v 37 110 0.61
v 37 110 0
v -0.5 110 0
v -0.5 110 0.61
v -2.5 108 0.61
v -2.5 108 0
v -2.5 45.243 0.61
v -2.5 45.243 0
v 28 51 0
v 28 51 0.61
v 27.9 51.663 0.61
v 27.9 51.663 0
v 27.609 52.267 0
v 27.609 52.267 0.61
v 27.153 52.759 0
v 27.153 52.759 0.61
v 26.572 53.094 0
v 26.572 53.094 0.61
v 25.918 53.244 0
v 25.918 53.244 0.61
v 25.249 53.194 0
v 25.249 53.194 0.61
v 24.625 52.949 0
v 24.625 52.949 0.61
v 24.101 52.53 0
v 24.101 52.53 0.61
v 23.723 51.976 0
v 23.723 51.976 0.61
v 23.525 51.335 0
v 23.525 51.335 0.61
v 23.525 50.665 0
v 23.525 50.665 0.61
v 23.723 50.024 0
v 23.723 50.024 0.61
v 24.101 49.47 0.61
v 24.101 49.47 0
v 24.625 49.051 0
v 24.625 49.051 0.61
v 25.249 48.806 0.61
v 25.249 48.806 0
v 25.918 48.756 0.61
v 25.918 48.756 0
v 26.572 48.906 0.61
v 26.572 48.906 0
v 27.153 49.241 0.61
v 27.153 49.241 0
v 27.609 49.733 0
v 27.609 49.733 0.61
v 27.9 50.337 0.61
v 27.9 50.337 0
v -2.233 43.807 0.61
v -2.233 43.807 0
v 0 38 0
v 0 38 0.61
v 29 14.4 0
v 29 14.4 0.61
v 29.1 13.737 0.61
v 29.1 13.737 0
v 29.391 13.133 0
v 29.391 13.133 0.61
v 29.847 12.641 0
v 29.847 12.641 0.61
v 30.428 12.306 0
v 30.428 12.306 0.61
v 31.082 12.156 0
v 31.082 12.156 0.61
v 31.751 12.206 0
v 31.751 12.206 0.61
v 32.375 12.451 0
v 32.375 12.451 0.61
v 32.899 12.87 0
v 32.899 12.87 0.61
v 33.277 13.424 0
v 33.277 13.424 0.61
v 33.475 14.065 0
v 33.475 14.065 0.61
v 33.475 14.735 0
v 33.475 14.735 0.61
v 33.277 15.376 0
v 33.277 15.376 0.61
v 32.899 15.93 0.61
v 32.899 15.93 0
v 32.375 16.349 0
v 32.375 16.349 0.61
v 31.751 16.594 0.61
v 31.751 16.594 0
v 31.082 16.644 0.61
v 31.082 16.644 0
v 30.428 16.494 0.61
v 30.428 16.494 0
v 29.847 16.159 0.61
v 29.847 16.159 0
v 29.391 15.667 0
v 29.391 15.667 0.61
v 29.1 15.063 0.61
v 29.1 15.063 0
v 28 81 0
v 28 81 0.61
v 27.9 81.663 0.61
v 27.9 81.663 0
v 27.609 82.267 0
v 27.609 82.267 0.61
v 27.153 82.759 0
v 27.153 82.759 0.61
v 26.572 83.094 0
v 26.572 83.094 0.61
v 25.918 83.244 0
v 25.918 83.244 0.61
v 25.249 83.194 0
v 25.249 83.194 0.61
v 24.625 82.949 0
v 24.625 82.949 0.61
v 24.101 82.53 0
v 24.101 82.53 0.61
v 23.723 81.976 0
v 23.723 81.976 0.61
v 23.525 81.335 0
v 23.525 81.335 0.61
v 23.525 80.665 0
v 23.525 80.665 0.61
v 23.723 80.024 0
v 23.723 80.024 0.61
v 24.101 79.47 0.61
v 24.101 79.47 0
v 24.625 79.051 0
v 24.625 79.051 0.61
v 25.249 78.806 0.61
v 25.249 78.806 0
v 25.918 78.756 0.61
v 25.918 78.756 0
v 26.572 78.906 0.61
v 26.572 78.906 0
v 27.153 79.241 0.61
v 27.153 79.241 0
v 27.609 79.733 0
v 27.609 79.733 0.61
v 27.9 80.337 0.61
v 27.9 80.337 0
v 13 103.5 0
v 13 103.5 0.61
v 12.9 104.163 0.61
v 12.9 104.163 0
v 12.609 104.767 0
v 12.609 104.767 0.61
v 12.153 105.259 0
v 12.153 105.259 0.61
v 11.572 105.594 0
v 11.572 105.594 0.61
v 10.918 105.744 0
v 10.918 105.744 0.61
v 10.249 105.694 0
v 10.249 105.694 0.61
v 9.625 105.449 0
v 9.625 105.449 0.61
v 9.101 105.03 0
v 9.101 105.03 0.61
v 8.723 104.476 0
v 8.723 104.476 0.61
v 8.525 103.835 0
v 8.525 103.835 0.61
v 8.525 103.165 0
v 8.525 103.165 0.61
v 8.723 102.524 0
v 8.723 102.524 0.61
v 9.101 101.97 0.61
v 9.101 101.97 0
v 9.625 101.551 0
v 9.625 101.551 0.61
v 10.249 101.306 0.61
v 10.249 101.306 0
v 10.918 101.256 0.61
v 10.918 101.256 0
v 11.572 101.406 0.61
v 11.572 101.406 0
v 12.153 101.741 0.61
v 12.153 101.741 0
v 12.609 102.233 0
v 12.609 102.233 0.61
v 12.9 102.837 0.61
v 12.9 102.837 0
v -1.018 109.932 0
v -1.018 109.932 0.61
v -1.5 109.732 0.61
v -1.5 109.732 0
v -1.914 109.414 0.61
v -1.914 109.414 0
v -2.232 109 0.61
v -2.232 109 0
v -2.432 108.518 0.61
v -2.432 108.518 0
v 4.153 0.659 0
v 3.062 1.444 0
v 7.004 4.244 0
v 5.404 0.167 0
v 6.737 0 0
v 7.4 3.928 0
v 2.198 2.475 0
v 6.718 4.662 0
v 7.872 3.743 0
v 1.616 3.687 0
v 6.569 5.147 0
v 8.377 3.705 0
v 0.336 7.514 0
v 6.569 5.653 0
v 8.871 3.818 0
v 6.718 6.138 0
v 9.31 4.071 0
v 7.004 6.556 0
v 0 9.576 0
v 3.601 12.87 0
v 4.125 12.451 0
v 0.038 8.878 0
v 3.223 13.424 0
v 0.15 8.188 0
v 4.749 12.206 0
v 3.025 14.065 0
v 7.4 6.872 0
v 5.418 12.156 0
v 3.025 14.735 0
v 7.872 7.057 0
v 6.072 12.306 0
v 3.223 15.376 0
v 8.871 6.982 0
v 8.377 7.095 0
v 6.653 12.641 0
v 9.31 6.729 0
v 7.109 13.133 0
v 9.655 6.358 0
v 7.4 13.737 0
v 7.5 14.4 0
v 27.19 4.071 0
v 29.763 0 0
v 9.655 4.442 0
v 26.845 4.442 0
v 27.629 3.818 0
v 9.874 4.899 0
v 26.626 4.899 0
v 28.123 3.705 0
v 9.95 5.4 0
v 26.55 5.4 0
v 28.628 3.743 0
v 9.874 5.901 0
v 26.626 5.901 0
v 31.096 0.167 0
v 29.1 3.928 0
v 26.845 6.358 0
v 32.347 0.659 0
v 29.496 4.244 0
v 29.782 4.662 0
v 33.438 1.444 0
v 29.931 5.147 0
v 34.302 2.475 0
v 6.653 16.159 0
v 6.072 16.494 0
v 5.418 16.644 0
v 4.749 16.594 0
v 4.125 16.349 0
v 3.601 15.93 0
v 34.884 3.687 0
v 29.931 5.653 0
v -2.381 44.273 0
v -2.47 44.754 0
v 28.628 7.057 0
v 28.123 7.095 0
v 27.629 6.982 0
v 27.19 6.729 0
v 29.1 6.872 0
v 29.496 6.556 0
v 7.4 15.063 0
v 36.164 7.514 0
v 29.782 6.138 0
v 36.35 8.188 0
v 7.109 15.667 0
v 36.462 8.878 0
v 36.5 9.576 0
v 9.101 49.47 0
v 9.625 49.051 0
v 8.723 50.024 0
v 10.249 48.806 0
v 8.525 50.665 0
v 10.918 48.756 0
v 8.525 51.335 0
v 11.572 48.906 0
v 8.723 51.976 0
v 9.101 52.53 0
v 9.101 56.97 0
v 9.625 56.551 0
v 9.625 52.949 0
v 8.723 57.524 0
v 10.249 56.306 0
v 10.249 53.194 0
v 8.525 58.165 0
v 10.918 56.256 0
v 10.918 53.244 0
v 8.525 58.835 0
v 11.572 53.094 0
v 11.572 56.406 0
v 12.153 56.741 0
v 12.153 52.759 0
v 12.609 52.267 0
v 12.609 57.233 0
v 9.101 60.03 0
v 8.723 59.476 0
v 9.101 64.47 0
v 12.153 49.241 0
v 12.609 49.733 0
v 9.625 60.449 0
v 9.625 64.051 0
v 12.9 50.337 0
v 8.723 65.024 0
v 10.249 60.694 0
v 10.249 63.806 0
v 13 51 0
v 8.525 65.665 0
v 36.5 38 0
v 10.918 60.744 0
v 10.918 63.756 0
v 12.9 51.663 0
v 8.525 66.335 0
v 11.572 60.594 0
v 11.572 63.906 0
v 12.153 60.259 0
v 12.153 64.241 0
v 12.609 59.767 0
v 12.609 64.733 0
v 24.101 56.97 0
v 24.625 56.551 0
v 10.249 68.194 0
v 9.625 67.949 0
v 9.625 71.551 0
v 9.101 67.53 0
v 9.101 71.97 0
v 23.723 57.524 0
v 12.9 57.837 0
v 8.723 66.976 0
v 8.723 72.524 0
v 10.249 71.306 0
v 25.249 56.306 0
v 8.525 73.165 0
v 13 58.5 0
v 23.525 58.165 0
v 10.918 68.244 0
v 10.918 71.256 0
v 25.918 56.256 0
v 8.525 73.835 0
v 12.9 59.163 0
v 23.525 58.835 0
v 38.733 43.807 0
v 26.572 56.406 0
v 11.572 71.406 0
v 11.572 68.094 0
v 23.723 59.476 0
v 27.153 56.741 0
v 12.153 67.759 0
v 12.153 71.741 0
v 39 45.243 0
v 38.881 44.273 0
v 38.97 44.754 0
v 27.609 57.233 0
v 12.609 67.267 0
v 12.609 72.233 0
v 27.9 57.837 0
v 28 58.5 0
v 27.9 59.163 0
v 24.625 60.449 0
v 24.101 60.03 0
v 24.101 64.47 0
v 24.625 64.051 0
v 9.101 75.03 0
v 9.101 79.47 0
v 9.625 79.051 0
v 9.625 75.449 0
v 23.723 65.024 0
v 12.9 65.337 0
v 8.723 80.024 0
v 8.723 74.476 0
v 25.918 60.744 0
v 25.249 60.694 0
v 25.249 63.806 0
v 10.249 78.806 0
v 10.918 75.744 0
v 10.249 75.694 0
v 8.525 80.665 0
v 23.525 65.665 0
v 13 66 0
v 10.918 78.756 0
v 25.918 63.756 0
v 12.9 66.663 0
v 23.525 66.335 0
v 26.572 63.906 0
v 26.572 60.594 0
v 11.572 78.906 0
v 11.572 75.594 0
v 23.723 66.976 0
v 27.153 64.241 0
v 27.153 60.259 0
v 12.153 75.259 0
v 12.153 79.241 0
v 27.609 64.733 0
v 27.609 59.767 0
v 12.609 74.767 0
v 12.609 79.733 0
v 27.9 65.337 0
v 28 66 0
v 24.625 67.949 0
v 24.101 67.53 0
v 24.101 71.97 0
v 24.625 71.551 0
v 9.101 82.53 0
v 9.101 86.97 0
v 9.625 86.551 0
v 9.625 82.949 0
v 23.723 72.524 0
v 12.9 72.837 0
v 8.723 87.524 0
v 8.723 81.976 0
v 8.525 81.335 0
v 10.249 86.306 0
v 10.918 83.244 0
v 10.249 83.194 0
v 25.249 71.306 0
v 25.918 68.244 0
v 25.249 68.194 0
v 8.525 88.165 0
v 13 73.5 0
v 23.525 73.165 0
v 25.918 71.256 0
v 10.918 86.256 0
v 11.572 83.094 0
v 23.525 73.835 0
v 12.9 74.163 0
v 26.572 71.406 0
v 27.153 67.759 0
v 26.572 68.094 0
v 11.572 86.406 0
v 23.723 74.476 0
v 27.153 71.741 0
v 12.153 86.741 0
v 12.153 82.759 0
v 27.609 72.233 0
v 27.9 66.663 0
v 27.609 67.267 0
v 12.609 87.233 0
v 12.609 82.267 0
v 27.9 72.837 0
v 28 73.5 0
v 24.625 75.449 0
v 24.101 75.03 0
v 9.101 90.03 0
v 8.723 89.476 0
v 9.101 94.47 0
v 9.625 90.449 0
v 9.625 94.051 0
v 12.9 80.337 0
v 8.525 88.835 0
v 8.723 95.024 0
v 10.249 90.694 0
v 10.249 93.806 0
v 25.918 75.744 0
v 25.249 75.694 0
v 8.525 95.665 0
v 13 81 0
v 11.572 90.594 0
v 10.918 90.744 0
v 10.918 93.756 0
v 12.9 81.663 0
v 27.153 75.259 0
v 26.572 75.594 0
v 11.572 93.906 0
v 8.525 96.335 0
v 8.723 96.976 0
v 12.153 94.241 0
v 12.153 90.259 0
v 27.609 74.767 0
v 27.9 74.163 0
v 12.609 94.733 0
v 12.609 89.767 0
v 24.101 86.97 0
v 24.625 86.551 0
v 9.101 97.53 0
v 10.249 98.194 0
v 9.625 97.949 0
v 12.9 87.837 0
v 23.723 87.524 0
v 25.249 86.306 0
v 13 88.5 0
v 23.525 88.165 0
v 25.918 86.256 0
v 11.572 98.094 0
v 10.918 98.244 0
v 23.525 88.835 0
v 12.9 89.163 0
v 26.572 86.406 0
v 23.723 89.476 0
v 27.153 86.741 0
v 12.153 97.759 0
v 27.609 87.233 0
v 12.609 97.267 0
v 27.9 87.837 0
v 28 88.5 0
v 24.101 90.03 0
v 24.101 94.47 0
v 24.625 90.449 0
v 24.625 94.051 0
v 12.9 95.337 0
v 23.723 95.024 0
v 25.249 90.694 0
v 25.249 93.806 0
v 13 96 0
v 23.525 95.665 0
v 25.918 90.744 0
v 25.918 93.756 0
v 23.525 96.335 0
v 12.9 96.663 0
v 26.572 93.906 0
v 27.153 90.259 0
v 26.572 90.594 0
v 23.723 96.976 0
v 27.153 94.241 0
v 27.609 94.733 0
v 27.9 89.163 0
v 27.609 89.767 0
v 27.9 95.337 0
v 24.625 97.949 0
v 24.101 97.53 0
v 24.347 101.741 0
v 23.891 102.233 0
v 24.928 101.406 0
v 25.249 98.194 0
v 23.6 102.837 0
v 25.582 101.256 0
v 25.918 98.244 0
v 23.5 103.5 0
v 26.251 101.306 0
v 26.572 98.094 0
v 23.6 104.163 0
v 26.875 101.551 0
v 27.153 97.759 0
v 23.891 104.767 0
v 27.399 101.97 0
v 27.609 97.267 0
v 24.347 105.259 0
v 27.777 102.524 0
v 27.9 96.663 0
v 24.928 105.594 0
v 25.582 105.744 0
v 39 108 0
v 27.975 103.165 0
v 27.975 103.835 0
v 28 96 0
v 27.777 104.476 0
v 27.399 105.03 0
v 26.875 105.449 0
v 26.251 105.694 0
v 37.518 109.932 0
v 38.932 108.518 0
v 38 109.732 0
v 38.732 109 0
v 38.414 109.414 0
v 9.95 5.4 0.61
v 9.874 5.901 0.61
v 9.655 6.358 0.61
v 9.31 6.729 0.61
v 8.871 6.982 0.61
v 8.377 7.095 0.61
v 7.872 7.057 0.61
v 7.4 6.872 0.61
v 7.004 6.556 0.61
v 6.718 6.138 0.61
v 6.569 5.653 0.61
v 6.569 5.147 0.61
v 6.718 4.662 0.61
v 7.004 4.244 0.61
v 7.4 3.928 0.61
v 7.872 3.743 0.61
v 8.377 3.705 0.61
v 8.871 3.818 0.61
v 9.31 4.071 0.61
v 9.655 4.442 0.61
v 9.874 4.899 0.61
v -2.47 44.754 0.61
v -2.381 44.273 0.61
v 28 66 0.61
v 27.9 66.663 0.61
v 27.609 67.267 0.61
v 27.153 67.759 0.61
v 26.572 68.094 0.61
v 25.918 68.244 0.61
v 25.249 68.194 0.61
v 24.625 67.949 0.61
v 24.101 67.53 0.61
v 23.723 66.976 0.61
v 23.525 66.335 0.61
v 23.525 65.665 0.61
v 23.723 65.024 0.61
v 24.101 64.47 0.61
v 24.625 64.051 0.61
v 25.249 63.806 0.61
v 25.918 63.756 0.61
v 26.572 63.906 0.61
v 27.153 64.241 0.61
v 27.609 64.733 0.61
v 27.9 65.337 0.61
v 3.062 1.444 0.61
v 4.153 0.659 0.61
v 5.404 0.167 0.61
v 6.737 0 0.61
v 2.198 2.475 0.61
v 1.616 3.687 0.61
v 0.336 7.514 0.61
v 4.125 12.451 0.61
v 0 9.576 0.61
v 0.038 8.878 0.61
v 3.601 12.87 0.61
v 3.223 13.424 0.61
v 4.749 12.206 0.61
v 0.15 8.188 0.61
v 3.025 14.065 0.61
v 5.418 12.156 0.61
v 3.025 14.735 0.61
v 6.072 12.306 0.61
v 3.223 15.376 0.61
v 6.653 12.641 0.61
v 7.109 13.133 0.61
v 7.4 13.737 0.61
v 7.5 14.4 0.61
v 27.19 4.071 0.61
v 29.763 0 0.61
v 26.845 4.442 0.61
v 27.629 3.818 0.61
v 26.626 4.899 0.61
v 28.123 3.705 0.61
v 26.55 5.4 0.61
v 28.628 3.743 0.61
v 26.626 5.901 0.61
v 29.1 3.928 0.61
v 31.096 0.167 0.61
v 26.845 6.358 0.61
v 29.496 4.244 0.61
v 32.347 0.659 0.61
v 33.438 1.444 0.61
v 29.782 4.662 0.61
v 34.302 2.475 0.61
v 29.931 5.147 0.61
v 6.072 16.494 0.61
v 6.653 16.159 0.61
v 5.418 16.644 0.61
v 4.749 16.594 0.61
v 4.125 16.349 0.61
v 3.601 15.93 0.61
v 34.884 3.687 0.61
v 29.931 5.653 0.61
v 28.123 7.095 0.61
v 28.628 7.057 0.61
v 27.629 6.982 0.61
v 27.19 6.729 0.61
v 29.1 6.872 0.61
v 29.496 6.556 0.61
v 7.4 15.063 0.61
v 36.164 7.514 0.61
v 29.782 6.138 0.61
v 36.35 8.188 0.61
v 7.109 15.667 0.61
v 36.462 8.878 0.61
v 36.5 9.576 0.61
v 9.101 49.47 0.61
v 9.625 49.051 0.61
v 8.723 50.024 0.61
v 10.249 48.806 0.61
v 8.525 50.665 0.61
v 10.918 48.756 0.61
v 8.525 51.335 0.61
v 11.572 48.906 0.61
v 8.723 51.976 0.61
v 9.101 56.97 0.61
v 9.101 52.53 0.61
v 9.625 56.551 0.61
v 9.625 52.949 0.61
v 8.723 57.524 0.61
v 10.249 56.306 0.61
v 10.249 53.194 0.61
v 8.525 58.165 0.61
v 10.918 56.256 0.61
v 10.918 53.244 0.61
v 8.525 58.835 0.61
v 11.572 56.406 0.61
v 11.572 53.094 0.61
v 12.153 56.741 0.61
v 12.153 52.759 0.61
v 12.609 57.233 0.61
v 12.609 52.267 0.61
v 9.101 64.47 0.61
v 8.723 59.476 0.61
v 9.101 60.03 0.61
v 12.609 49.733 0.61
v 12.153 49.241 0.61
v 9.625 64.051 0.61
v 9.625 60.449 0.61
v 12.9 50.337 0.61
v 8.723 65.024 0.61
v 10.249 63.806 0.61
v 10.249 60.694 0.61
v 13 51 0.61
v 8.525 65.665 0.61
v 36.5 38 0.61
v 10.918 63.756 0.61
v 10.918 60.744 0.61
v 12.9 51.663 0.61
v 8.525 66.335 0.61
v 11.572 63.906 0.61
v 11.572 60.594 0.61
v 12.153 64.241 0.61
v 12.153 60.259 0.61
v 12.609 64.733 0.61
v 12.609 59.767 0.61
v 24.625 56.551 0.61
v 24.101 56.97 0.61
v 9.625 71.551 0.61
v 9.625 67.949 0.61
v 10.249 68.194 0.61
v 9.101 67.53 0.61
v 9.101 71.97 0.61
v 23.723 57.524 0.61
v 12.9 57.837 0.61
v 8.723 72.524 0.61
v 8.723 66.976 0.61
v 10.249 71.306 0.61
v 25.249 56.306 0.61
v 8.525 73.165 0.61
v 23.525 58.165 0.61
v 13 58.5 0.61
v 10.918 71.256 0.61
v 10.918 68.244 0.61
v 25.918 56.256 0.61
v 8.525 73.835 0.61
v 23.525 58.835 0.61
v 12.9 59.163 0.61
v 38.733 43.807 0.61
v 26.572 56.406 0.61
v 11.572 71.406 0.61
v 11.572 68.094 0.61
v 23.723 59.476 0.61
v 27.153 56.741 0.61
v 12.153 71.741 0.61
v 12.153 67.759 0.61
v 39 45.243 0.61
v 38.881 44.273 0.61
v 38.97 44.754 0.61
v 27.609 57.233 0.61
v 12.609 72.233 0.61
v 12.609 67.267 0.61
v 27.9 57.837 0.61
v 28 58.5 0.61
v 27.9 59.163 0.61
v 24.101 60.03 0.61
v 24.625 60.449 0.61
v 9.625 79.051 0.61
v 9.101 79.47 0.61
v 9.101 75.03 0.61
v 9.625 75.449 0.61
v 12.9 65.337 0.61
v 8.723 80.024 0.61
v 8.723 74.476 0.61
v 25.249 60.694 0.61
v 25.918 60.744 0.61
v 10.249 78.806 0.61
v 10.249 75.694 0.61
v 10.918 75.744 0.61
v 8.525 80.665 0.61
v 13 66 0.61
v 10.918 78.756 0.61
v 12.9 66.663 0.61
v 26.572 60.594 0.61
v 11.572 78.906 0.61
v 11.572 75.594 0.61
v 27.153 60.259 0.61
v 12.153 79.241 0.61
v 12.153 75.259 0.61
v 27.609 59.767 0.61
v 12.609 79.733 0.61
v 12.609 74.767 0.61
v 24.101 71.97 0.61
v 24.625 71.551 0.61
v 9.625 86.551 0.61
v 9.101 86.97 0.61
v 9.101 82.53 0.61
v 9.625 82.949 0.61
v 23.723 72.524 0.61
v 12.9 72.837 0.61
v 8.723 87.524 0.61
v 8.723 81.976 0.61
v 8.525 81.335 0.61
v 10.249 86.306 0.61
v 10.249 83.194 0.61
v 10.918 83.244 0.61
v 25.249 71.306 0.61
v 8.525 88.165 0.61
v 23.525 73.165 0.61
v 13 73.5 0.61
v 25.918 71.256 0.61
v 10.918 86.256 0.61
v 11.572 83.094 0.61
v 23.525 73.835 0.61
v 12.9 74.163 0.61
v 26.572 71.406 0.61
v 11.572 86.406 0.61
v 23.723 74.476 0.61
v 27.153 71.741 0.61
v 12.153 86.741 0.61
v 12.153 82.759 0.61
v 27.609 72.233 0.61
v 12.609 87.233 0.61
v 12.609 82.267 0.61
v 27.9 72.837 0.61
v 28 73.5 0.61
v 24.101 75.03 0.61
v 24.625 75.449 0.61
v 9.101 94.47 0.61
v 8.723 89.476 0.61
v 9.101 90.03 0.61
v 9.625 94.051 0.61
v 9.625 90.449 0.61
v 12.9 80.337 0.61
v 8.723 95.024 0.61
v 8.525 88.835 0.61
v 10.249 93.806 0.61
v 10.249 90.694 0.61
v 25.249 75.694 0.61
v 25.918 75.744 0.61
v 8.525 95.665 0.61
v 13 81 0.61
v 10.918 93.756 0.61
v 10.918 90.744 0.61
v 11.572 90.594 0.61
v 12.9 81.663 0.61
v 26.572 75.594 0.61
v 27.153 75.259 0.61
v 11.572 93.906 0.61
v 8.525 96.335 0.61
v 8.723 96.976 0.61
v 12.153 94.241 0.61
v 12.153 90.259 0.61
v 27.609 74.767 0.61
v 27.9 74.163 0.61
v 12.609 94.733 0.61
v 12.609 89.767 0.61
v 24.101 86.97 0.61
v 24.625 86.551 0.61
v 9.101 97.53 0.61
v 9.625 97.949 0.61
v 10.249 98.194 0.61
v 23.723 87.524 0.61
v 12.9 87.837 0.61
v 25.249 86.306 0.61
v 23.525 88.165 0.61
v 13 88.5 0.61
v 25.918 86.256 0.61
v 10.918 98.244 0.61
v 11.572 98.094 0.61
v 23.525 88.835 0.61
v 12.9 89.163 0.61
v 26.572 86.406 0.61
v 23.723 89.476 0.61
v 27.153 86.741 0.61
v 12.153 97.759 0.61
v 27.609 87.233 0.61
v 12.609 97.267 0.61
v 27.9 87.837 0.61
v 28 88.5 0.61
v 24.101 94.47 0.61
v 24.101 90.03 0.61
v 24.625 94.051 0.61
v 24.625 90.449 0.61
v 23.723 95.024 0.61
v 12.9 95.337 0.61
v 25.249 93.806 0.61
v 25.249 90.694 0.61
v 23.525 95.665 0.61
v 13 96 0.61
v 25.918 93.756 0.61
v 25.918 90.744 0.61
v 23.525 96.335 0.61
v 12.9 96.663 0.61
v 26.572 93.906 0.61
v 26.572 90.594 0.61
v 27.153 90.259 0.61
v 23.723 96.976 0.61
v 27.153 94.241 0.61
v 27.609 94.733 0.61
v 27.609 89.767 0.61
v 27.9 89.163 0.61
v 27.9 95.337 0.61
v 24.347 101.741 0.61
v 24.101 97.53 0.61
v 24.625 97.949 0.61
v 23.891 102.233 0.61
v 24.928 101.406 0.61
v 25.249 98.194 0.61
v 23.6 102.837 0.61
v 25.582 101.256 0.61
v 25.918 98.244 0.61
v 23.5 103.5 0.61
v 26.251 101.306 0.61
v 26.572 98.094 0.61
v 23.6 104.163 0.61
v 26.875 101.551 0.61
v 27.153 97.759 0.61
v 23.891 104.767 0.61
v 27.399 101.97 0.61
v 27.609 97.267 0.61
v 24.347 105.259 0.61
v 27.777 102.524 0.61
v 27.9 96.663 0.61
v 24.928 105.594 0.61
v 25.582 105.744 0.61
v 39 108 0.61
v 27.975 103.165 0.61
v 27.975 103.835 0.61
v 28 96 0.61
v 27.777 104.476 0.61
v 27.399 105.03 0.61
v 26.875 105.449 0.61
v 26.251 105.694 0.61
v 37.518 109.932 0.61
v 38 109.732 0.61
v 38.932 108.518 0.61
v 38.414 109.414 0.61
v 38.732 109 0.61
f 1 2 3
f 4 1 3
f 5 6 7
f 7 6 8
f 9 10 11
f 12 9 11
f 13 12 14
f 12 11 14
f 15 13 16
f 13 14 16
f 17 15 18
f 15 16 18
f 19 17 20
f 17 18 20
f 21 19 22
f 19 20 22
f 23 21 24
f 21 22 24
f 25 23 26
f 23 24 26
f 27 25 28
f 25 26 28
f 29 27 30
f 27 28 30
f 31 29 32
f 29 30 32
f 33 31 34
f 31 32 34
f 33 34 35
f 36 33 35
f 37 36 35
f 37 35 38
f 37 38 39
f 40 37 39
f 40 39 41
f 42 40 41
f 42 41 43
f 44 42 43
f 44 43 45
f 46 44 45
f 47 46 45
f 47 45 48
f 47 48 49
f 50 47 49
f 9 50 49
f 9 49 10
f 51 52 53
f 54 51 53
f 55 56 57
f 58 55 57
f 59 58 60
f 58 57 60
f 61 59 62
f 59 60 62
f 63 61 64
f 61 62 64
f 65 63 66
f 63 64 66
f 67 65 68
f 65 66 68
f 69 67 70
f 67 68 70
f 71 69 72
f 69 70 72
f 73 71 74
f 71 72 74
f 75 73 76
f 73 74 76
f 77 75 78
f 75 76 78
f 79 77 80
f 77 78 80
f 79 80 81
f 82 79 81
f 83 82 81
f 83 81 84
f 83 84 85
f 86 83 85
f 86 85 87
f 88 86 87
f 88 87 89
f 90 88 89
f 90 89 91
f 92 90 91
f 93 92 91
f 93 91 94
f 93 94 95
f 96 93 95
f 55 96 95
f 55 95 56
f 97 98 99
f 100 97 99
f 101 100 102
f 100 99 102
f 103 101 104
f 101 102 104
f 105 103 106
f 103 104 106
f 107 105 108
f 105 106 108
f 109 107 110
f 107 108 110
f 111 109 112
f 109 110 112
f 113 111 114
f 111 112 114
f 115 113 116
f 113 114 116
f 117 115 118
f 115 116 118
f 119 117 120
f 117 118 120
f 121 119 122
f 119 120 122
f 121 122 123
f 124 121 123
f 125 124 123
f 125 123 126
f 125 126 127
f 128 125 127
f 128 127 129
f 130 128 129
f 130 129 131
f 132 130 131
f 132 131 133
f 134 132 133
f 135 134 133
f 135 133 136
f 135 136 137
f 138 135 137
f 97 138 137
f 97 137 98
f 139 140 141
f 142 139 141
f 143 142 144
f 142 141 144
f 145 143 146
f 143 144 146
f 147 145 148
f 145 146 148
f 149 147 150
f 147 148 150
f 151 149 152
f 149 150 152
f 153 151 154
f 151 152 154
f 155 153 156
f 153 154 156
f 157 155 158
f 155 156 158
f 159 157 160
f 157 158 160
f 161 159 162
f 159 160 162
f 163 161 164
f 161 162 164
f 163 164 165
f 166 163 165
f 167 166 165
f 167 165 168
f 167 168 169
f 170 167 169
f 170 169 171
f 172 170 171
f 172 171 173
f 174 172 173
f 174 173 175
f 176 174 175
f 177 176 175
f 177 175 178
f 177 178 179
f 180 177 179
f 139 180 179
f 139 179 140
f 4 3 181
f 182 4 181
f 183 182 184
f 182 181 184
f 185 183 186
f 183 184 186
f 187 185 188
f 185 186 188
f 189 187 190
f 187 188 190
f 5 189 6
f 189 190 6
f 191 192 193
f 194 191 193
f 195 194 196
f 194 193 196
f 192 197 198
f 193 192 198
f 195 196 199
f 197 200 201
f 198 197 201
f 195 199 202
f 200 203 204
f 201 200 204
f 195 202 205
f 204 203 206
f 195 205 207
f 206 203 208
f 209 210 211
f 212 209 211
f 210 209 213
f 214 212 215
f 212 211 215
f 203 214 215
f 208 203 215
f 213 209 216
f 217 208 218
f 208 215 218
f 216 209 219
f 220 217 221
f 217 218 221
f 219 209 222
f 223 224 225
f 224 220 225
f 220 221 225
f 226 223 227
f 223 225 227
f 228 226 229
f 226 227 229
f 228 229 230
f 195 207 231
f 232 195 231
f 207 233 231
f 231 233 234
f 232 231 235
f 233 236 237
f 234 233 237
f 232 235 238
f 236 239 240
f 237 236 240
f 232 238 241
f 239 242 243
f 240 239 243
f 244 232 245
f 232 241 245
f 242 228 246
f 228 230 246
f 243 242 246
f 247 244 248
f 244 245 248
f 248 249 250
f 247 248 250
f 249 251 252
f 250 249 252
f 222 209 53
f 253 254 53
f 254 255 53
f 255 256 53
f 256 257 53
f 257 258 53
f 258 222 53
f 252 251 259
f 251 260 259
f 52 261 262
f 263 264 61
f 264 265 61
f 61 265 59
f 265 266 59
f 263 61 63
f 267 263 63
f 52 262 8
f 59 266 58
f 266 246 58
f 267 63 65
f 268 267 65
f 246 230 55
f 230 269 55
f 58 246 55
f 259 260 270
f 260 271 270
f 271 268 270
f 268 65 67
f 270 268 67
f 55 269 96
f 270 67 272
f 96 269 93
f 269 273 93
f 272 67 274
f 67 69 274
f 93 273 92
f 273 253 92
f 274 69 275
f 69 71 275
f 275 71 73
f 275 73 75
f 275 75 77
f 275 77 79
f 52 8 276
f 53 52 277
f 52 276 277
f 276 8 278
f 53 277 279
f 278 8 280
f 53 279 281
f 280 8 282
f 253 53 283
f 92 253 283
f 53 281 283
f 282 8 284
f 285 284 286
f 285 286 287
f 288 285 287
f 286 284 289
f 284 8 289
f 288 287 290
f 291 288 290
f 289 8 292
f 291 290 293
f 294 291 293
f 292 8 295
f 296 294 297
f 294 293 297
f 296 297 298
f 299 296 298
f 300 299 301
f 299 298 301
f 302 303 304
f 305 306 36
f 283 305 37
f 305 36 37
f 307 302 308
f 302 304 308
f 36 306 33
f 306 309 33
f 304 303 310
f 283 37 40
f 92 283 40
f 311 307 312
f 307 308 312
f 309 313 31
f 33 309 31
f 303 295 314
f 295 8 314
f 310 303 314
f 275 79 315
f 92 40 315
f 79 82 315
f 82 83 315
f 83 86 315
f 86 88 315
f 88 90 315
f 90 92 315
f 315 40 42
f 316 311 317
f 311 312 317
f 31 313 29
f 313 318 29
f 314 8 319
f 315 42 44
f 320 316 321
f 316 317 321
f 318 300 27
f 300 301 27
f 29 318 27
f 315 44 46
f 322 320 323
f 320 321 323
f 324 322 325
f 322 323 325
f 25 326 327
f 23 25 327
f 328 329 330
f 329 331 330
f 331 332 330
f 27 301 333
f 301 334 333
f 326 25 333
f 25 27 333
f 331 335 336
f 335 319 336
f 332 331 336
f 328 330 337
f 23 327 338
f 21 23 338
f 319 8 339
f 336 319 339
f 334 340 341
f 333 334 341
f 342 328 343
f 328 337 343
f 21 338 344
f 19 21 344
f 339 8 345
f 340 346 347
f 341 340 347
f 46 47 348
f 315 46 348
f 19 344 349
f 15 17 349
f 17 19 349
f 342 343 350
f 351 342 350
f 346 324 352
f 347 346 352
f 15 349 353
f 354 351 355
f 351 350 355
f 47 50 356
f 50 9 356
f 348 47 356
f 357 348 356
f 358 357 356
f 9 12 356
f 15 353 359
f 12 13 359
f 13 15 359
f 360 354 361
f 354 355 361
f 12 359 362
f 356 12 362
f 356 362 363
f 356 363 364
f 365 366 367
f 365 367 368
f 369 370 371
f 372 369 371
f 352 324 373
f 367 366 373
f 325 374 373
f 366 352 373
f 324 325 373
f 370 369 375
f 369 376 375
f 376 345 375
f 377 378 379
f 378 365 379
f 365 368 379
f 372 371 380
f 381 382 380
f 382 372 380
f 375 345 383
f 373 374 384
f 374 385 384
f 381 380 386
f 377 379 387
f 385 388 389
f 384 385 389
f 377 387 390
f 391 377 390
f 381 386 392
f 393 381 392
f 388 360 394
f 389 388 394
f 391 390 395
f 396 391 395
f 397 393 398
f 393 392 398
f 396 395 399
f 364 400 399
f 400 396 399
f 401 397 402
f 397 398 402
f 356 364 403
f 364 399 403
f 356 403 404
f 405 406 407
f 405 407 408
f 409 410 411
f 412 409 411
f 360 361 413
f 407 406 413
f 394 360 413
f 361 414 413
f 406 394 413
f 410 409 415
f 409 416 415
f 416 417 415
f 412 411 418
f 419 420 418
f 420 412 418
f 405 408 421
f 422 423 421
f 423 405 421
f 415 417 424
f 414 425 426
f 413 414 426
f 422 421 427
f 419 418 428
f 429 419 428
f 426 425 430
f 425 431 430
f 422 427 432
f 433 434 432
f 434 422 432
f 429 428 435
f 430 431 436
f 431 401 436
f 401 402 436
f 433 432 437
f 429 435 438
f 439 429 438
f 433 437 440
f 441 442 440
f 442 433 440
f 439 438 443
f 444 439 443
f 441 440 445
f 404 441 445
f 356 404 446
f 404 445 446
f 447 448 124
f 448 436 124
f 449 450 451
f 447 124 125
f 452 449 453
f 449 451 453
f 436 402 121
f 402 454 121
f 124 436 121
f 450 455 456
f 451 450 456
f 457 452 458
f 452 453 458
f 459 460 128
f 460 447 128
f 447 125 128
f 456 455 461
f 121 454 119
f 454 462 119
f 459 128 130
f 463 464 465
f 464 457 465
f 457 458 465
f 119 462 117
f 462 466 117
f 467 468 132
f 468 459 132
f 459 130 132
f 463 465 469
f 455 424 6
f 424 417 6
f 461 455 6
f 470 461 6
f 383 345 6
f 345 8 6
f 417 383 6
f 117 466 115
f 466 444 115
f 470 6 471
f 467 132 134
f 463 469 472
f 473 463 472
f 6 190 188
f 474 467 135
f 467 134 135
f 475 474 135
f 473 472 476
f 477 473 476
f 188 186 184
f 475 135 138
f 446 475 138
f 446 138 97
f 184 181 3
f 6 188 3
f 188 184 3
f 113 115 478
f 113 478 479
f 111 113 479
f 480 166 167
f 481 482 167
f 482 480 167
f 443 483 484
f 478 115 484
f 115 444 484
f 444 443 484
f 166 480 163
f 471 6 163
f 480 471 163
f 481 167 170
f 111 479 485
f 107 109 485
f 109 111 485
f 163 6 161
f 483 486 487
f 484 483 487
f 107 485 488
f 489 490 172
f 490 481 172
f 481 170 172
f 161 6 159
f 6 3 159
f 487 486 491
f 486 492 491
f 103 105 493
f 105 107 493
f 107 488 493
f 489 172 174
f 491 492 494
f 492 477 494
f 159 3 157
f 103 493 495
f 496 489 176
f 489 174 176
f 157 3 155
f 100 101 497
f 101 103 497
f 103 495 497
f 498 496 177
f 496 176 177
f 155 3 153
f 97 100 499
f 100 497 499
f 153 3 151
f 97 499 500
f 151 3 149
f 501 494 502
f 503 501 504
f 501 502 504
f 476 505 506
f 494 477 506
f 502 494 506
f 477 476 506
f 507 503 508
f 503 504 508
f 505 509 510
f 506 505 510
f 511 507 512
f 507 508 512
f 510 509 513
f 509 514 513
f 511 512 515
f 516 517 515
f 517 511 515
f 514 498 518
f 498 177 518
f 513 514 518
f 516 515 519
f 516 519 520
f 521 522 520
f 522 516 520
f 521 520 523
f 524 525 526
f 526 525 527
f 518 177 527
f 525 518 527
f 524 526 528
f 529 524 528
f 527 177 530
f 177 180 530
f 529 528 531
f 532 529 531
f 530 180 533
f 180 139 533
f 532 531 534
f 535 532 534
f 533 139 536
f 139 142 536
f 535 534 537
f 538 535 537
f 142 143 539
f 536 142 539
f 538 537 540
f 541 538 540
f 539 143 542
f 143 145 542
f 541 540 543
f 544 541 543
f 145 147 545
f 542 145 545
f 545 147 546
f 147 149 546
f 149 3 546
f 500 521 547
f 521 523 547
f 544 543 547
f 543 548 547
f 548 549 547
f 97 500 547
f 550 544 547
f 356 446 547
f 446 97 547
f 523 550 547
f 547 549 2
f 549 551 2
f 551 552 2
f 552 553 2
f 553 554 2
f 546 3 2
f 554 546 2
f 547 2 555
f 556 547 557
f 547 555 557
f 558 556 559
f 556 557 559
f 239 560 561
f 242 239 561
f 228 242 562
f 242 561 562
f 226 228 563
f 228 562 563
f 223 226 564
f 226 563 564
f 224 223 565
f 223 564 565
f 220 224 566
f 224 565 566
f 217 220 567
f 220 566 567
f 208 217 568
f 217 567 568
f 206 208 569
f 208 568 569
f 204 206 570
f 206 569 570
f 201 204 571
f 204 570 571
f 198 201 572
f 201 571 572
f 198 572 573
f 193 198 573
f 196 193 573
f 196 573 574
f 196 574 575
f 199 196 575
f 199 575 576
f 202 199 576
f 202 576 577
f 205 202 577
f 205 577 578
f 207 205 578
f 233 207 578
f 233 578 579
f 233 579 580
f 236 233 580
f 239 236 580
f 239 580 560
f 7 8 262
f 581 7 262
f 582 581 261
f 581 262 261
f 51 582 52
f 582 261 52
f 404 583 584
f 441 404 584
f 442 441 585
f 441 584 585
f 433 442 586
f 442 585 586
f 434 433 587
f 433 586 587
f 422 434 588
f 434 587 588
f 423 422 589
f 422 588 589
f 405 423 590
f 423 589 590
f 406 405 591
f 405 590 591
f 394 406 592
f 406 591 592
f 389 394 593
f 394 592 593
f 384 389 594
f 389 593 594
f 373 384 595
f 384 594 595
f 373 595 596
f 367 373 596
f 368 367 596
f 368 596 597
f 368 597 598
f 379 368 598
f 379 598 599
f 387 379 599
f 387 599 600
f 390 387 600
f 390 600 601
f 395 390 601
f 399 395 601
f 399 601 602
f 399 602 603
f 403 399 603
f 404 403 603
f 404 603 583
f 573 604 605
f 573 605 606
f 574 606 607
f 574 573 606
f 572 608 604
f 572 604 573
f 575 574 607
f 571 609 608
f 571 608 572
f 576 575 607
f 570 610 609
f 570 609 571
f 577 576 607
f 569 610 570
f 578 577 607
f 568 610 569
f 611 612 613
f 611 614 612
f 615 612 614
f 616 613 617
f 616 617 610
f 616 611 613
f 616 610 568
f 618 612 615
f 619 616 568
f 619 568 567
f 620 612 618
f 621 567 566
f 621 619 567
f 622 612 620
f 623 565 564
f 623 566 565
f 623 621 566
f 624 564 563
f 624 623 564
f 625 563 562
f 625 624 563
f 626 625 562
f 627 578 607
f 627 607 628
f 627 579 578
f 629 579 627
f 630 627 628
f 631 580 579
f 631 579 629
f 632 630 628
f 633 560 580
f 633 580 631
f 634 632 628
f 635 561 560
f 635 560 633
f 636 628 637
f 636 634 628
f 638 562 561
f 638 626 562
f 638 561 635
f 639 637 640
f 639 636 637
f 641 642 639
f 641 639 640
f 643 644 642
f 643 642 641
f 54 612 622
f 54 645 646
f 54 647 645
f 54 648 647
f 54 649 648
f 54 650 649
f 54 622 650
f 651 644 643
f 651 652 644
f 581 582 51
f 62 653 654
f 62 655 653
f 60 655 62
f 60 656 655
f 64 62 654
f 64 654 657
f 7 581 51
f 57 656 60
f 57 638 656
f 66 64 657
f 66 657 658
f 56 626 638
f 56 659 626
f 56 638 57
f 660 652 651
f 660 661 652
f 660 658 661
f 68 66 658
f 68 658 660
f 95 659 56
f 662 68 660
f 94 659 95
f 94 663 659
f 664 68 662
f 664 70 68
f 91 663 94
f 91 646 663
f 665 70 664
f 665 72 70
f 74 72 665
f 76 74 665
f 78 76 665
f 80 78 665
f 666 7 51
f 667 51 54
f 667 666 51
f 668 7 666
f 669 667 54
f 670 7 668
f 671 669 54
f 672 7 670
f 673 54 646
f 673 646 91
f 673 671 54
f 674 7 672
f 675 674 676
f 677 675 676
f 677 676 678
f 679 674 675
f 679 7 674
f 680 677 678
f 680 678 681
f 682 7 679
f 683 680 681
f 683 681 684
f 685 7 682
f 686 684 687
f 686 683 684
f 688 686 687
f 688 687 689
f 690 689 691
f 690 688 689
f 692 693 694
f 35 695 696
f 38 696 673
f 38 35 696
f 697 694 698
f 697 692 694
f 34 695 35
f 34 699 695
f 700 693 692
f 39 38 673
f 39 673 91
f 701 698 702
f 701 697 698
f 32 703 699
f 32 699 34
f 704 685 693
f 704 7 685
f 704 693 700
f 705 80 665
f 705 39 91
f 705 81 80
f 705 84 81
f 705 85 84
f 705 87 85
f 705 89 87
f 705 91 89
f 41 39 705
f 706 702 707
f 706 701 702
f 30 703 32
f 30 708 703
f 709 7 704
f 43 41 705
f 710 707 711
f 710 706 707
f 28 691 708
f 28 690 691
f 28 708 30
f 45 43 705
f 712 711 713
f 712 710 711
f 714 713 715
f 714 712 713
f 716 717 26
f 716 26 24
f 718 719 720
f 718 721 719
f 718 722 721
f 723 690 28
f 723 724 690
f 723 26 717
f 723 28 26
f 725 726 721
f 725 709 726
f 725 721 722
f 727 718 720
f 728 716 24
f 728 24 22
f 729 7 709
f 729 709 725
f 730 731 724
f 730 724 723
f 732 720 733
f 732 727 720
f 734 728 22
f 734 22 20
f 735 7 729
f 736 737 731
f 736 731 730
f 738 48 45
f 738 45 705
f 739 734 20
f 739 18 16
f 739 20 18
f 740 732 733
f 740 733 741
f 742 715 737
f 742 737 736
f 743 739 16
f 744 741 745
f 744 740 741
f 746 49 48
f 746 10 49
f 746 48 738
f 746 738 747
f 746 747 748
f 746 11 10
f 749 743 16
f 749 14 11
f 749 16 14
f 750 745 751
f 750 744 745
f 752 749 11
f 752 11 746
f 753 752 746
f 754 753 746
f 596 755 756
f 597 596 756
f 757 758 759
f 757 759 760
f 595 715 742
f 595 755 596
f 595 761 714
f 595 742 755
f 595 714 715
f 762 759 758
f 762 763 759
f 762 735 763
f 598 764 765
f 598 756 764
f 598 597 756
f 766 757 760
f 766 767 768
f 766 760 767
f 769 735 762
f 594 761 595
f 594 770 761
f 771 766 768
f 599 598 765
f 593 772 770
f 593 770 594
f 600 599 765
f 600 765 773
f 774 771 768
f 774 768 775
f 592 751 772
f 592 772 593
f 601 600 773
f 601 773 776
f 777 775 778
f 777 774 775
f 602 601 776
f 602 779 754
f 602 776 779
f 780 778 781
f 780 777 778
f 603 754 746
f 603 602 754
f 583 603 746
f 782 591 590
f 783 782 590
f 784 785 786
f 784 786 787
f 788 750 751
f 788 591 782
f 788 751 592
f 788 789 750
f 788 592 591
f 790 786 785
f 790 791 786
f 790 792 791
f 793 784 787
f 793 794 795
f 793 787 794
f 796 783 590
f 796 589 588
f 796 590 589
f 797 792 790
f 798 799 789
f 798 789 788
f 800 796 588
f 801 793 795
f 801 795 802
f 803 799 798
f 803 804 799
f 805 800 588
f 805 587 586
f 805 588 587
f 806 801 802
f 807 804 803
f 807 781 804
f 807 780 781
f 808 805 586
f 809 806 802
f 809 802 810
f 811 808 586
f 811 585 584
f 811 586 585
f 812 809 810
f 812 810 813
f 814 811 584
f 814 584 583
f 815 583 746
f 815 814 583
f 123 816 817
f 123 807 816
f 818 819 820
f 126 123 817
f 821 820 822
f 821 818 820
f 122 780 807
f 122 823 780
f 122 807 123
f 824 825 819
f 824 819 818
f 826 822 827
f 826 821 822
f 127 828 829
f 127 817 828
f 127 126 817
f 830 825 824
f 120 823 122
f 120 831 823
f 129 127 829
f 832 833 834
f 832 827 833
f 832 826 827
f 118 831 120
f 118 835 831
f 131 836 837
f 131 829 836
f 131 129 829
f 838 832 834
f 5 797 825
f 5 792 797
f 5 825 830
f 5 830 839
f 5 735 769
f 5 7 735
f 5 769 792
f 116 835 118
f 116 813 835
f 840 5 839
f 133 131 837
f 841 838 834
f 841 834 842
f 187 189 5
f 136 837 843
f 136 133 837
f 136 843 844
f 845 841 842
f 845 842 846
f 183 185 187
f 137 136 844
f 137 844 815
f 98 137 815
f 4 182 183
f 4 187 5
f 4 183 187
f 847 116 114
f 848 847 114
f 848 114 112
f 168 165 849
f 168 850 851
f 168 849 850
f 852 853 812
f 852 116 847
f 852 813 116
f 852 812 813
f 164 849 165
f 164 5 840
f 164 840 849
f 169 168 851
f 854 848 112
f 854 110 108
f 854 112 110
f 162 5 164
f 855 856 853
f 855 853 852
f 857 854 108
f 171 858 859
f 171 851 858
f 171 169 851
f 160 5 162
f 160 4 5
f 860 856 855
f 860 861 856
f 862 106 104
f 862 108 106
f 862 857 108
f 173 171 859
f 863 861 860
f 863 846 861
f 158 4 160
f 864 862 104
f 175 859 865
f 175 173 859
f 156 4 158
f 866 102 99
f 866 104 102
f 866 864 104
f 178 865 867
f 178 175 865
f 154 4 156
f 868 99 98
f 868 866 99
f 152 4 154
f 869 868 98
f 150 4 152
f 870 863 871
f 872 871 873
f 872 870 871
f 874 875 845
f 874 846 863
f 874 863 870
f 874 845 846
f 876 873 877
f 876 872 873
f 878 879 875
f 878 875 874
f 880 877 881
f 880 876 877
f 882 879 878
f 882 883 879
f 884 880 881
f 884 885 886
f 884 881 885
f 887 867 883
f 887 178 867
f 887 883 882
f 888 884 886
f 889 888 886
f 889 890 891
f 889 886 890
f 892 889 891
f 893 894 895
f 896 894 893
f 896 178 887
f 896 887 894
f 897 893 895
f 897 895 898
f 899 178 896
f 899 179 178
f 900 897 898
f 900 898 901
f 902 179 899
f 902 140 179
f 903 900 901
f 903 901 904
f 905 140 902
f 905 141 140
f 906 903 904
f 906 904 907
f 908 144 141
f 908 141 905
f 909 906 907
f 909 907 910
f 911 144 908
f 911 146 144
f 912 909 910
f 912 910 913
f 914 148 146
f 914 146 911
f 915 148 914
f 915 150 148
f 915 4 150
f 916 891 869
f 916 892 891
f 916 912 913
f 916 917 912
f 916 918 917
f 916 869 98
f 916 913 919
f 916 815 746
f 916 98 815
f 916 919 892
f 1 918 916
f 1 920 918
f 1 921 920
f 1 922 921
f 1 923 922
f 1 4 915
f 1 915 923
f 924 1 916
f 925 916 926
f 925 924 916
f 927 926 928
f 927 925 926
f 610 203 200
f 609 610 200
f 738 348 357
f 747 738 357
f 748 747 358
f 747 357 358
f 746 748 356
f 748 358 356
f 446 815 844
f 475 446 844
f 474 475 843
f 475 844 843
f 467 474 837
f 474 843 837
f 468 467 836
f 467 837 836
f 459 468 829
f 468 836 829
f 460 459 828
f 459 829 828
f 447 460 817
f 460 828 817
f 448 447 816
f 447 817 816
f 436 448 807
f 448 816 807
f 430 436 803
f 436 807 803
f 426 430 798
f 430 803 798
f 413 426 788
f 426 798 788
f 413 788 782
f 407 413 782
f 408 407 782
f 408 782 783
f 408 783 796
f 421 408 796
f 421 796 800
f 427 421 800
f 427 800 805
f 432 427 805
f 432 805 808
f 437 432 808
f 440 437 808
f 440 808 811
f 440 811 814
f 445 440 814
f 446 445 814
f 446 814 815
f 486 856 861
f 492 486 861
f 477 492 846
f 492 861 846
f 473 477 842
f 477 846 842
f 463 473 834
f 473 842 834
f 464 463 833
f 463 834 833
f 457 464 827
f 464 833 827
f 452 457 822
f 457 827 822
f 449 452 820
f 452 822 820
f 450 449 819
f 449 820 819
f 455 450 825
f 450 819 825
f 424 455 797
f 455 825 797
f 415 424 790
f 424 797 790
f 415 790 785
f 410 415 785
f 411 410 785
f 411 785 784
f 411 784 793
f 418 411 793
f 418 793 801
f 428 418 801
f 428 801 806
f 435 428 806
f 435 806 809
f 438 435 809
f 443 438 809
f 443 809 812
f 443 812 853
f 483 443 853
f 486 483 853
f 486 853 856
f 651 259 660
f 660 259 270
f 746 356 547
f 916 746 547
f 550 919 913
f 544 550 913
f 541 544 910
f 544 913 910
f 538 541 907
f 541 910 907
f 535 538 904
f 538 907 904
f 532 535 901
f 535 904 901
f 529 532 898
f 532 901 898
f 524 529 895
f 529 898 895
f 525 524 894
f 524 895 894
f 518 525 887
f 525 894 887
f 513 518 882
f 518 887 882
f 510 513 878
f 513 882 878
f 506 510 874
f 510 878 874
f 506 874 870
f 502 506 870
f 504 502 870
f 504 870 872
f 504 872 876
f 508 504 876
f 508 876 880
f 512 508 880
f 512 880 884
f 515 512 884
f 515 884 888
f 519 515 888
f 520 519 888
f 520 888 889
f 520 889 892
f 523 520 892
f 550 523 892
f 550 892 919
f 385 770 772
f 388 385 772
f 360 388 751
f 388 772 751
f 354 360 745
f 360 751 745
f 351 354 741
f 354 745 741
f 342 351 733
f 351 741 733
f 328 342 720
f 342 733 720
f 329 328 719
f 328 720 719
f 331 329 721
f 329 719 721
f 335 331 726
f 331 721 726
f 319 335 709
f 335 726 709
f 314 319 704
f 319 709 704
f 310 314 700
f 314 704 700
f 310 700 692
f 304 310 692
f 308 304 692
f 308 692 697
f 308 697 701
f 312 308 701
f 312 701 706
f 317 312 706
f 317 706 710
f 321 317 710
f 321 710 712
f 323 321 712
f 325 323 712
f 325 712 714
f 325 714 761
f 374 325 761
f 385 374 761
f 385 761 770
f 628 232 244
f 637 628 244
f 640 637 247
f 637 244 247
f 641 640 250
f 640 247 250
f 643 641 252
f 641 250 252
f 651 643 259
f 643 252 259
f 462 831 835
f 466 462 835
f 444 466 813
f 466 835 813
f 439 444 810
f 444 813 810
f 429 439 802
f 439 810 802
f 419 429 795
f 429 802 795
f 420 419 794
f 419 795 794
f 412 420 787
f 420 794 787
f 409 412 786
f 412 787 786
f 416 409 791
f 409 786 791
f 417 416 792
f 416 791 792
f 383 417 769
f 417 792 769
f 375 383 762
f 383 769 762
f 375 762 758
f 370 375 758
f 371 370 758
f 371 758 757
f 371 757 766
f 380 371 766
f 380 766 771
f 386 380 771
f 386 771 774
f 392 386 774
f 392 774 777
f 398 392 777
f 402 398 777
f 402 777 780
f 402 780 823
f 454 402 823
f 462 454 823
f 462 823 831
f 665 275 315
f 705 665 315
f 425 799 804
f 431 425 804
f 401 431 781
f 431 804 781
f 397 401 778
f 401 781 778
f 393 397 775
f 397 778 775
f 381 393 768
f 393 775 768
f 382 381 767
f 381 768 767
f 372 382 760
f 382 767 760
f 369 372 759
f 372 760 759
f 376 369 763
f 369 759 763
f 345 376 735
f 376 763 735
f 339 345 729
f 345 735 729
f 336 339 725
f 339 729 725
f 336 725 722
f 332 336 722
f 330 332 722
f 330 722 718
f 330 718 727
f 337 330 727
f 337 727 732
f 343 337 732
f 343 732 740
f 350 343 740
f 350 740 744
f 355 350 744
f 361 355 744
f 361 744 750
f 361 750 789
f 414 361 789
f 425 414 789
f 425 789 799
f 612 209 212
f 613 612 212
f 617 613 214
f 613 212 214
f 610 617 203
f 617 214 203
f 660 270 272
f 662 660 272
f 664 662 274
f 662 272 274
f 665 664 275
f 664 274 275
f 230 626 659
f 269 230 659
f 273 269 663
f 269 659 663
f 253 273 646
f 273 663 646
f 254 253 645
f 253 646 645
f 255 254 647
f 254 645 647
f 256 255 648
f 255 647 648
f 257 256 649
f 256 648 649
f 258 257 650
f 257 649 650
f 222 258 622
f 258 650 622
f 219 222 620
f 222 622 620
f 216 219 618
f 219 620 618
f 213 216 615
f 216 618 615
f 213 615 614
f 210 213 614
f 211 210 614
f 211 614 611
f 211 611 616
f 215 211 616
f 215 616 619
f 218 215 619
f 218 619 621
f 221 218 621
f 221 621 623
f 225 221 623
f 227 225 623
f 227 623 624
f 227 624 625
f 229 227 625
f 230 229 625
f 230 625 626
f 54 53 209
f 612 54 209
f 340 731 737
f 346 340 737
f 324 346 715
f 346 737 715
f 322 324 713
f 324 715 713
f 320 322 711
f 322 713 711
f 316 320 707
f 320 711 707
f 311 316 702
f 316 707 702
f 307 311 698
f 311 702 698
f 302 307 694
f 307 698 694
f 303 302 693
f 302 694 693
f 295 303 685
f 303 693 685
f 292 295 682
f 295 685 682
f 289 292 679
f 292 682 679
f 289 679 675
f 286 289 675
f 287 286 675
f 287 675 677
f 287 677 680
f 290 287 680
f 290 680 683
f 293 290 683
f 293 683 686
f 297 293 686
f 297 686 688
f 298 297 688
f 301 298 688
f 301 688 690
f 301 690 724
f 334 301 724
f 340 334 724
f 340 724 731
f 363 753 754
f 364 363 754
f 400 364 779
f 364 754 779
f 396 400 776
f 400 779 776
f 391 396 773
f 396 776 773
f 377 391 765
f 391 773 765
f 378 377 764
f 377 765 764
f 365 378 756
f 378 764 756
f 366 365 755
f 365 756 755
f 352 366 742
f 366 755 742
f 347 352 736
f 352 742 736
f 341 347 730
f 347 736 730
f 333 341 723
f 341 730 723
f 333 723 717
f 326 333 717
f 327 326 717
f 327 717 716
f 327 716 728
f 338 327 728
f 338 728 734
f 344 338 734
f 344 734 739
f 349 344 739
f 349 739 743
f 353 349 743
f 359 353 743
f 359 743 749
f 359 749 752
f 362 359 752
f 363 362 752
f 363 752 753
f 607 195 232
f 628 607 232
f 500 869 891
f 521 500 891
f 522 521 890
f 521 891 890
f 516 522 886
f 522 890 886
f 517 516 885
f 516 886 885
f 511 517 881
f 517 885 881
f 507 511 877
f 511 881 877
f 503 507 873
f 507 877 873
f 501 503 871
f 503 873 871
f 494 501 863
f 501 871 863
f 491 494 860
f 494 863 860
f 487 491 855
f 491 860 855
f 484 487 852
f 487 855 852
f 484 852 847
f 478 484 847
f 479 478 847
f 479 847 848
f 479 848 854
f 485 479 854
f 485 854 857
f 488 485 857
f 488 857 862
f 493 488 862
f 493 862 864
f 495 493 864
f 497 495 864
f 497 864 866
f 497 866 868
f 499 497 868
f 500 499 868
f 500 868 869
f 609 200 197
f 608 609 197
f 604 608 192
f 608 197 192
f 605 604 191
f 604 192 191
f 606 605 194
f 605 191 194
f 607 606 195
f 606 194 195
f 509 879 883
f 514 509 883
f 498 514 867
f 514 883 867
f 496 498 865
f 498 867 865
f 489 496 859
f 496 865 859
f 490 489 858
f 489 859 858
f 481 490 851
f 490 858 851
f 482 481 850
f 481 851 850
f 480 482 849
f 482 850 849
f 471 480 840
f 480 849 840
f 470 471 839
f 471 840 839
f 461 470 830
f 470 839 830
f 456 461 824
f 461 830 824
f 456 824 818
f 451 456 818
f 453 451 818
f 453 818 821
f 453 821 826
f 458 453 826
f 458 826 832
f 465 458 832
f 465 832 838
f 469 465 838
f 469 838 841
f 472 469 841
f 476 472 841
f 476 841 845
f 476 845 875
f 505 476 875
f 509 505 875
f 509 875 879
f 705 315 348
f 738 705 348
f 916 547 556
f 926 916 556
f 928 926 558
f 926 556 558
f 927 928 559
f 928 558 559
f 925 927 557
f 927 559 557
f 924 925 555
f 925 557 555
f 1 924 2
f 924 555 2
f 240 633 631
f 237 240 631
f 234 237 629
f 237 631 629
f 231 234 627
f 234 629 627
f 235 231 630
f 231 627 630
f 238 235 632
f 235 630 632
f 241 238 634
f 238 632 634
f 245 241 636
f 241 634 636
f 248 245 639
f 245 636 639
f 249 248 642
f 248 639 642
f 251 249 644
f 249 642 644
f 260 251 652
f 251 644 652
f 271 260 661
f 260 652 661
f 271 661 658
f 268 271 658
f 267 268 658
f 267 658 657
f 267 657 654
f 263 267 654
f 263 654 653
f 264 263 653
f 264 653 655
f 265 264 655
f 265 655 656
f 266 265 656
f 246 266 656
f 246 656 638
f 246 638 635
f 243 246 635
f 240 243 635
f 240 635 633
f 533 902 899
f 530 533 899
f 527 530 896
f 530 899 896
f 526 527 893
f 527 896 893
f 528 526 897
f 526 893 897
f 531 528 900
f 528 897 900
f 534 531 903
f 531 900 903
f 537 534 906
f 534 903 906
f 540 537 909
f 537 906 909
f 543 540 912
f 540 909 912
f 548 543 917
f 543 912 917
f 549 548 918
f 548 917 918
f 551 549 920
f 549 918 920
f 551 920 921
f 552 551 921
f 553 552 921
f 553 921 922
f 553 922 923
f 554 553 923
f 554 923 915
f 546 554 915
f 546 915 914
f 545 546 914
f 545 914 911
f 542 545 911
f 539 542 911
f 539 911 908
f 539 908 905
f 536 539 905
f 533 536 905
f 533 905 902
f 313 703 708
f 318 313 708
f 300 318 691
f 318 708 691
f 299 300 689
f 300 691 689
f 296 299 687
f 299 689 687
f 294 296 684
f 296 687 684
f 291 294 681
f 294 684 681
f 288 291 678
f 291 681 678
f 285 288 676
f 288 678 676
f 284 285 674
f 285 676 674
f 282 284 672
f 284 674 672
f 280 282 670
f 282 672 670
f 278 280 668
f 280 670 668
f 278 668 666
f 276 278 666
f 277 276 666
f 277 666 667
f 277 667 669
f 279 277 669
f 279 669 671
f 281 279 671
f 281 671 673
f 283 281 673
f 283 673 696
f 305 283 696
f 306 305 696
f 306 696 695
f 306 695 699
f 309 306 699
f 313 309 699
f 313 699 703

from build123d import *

# Parameters (mm, degrees)
BOSS_EXTRUDE1_DEPTH = 0.6096
SKETCH3_R           = 1.7
SKETCH3_R_2         = 2.25
CUT_EXTRUDE1_DEPTH  = 116.89918728
SKETCH5_R           = 2.25
CUT_EXTRUDE2_DEPTH  = 116.89918728
LPATTERN1_COUNT     = 7
LPATTERN1_PITCH     = 7.5
BOSS_EXTRUDE2_START = -0.6096
BOSS_EXTRUDE2_DEPTH = 0.6096


with BuildPart() as part:
    # Sketch2 → Boss-Extrude1 (new body)
    with BuildSketch(Plane.XY):
        with BuildLine():
            Line((34.883504, 3.686554855), (36.164103759, 7.513864099))
            ThreePointArc((36.164103759, 7.513864099), (36.415476383, 8.531517689), (36.5, 9.576344365))
            Line((36.5, 9.576344365), (36.5, 108))
            ThreePointArc((36.5, 108), (35.914213562, 109.414213562), (34.5, 110))
            Line((34.5, 110), (2, 110))
            ThreePointArc((2, 110), (0.585786438, 109.414213562), (0, 108))
            Line((0, 108), (0, 9.576344365))
            ThreePointArc((0, 9.576344365), (0.084523617, 8.531517689), (0.335896241, 7.513864099))
            Line((0.335896241, 7.513864099), (1.616496, 3.686554855))
            ThreePointArc((1.616496, 3.686554855), (3.582495544, 1.017500497), (6.737443738, 0))
            Line((6.737443738, 0), (29.762556262, 0))
            ThreePointArc((29.762556262, 0), (32.917504456, 1.017500497), (34.883504, 3.686554855))
        make_face()
    extrude(amount=BOSS_EXTRUDE1_DEPTH)

    # Sketch3 → Cut-Extrude1 (cut, through all)
    with BuildSketch(Plane.XY.offset(0.6096)):
        with Locations((8.25, 5.4)):
            Circle(SKETCH3_R)
        with Locations((5.25, 14.4)):
            Circle(SKETCH3_R_2)
        with Locations((10.75, 103.5)):
            Circle(SKETCH3_R_2)
        with Locations(Location((28.25, 5.4, 0), (0, 0, 180))):
            Circle(SKETCH3_R)
        with Locations(Location((31.25, 14.4, 0), (0, 0, 180))):
            Circle(SKETCH3_R_2)
        with Locations(Location((25.75, 103.5, 0), (0, 0, 180))):
            Circle(SKETCH3_R_2)
    extrude(amount=-CUT_EXTRUDE1_DEPTH, mode=Mode.SUBTRACT)

    # Sketch5 → Cut-Extrude2 (cut, through all)
    with BuildSketch(Plane.XY.offset(0.6096)):
        with Locations((10.75, 96)):
            Circle(SKETCH5_R)
        with Locations((25.75, 96)):
            Circle(SKETCH5_R)
    cut_extrude2 = extrude(amount=-CUT_EXTRUDE2_DEPTH, mode=Mode.SUBTRACT)

    # LPattern1: Cut-Extrude2 ×7
    with Locations(*[(0, -i * LPATTERN1_PITCH, 0) for i in range(1, LPATTERN1_COUNT)]):
        add(cut_extrude2, mode=Mode.SUBTRACT)

    # Sketch7 → Boss-Extrude2 (add)
    with BuildSketch(Plane.XY.offset(0.6096).offset(BOSS_EXTRUDE2_START)):
        with BuildLine():
            ThreePointArc((0, 108), (0.585786438, 109.414213562), (2, 110))
            Line((2, 110), (-0.5, 110))
            ThreePointArc((-0.5, 110), (-1.914213562, 109.414213562), (-2.5, 108))
            Line((-2.5, 108), (-2.5, 45.242710622))
            ThreePointArc((-2.5, 45.242710622), (-2.432780804, 44.512481103), (-2.233382425, 43.806794305))
            Line((-2.233382425, 43.806794305), (0, 38))
            Line((0, 38), (0, 108))
        make_face()
        with BuildLine():
            Line((36.5, 108), (36.5, 38))
            Line((36.5, 38), (38.733382425, 43.806794305))
            ThreePointArc((38.733382425, 43.806794305), (38.932780804, 44.512481103), (39, 45.242710622))
            Line((39, 45.242710622), (39, 108))
            ThreePointArc((39, 108), (38.414213562, 109.414213562), (37, 110))
            Line((37, 110), (34.5, 110))
            ThreePointArc((34.5, 110), (35.914213562, 109.414213562), (36.5, 108))
        make_face()
    extrude(amount=BOSS_EXTRUDE2_DEPTH)


solid = part.part
